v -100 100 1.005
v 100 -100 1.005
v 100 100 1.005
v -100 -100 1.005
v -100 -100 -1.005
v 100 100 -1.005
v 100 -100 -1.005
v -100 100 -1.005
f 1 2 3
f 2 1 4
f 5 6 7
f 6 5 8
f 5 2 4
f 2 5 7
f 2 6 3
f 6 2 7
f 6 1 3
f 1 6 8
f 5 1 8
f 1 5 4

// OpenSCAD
// Parameters
sheet_length = 200; //[100:400:1]
sheet_width  = 200; //[100:400:1]
sheet_thickness = 2; //[1:4:0.5]

// Safeguards to ensure visible, non-degenerate geometry
min_th = 0.5;   // keep at least 0.5mm so renders don't look blank
eps = 0.01;

// Geometry
module sheet_body() {
  color([0.85, 0.85, 0.8])
    cube([sheet_length, sheet_width, max(sheet_thickness, min_th) + eps], center=true);
}

// Final Output (single connected solid)
sheet_body();
